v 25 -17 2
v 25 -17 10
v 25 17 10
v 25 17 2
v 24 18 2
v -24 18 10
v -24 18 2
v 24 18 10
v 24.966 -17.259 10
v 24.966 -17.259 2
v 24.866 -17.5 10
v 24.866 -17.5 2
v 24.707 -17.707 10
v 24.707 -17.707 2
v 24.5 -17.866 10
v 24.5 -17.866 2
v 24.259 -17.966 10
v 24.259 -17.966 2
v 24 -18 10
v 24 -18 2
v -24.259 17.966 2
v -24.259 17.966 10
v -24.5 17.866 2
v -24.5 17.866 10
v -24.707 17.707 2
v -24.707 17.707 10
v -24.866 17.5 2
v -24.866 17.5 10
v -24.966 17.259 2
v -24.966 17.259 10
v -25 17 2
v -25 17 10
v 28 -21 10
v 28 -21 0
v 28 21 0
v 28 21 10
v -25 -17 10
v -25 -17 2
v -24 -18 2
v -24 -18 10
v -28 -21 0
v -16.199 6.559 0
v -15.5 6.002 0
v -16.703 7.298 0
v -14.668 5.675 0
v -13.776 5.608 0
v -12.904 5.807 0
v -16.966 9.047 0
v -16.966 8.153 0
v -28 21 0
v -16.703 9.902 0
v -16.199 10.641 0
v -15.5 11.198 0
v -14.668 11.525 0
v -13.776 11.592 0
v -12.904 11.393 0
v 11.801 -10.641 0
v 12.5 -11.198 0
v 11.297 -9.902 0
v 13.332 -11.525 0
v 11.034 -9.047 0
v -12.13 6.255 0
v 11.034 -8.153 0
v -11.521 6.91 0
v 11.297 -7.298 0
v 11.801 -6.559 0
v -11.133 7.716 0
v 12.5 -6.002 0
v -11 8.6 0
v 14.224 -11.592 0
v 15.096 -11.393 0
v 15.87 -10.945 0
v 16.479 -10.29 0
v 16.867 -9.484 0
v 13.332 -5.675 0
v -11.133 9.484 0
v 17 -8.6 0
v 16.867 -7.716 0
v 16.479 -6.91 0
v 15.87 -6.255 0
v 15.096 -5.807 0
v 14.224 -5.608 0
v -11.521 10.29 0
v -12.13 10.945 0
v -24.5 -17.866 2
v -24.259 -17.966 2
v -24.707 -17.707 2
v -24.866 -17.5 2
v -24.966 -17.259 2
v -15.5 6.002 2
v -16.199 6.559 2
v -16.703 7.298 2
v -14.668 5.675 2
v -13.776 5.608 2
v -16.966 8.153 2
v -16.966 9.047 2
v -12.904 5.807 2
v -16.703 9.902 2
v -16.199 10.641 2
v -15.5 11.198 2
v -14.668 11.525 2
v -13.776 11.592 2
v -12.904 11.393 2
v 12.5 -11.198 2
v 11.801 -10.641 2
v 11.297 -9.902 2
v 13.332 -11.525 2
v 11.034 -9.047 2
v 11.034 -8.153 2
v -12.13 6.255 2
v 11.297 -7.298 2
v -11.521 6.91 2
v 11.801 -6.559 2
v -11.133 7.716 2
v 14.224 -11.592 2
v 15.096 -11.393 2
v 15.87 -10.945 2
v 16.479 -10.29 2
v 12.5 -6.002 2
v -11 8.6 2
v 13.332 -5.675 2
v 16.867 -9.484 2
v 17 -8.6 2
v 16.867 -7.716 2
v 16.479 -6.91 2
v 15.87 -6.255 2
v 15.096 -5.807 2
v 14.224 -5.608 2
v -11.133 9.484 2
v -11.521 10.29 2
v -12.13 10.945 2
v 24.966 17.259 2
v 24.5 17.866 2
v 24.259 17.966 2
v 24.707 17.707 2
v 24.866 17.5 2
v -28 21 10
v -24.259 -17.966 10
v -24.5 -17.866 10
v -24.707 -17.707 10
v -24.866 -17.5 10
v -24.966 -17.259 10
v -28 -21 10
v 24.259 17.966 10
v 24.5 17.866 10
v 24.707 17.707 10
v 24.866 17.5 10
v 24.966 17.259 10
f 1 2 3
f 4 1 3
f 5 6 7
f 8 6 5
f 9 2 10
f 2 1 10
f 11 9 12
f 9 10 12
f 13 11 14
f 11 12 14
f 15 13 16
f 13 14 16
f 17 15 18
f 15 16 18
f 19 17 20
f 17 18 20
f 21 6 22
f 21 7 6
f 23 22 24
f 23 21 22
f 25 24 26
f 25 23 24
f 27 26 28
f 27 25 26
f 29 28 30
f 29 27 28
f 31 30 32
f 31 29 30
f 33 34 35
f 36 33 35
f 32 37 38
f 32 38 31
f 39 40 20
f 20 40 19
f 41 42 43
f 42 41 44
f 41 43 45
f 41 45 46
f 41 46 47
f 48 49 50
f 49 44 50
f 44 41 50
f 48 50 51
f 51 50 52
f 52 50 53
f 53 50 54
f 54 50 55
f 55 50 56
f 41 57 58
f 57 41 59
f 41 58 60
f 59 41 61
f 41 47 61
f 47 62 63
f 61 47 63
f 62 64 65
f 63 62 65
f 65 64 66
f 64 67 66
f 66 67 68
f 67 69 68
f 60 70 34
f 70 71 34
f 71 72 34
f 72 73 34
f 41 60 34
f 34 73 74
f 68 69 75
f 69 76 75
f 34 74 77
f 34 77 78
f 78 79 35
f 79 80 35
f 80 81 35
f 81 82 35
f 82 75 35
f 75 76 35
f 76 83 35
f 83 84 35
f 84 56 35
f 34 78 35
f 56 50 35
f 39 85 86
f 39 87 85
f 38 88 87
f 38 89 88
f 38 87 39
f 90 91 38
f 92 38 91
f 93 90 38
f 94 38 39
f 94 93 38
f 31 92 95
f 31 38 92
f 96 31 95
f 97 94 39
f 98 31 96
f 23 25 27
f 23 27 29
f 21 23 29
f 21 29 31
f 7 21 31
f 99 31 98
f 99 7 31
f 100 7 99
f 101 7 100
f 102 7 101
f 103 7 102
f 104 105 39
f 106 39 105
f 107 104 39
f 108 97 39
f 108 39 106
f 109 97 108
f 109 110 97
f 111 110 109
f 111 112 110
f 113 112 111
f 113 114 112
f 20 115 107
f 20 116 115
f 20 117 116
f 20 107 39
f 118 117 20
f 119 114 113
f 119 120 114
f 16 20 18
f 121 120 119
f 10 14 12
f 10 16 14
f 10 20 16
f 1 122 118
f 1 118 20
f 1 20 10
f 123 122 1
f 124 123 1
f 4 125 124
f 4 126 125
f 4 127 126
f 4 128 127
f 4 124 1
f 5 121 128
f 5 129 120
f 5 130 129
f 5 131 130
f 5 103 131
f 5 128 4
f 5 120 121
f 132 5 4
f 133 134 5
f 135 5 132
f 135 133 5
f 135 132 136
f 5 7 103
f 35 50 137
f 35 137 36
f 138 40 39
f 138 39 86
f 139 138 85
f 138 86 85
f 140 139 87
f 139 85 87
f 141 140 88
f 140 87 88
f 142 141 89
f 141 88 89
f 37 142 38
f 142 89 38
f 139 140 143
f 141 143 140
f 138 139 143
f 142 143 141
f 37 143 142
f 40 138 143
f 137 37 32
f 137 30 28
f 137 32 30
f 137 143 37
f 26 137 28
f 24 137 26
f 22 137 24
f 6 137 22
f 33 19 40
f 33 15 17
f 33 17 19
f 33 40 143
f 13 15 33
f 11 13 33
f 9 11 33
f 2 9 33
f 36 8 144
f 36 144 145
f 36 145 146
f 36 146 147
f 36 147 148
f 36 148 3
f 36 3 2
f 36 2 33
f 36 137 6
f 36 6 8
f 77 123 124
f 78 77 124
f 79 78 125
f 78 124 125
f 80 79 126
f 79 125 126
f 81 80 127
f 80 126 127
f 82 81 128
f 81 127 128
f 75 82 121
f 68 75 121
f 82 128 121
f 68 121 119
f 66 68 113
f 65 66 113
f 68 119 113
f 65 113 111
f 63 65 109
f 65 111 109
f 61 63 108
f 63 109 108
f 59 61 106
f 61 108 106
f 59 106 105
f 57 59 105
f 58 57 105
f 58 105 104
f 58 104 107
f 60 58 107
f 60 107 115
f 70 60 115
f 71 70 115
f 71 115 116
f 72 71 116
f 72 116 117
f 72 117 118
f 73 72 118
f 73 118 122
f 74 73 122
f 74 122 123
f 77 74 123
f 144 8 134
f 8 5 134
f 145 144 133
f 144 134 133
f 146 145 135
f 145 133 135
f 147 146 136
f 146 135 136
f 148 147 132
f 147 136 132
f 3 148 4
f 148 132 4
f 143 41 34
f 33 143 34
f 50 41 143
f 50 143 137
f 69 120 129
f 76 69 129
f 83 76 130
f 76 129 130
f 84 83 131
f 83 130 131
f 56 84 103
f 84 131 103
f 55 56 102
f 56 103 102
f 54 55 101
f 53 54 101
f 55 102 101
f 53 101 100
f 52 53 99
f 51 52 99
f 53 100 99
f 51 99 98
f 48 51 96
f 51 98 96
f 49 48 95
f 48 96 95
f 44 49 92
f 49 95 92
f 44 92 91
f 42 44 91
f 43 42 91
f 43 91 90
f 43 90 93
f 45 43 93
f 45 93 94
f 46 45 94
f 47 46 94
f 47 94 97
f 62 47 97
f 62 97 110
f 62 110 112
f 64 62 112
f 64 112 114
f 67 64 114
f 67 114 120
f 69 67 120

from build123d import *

# Parameters (mm, degrees)
SKETCH_W     = 56
SKETCH_H     = 42
PAD_DEPTH    = 10
SKETCH002_W  = 50
SKETCH002_H  = 36
POCKET_DEPTH = 8
FILLET_R     = 1
FILLET001_R  = 1
FILLET002_R  = 1
FILLET003_R  = 1
SKETCH003_R  = 3
HOLE_DEPTH   = 25


with BuildPart() as part:
    # Sketch → Pad (new body)
    with BuildSketch(Plane.XY):
        Rectangle(SKETCH_W, SKETCH_H)
    extrude(amount=PAD_DEPTH)

    # Sketch002 (on Face6 of Pad) → Pocket (cut)
    with BuildSketch(Plane.XY.offset(10)):
        Rectangle(SKETCH002_W, SKETCH002_H)
    extrude(amount=-POCKET_DEPTH, mode=Mode.SUBTRACT)

    # Fillet
    fillet_edges = [part.edges().sort_by_distance(p)[0] for p in [
        (-25, 18, 6),
    ]]
    fillet(fillet_edges, radius=FILLET_R)

    # Fillet001
    fillet001_edges = [part.edges().sort_by_distance(p)[0] for p in [
        (25, 18, 6),
    ]]
    fillet(fillet001_edges, radius=FILLET001_R)

    # Fillet002
    fillet002_edges = [part.edges().sort_by_distance(p)[0] for p in [
        (25, -18, 6),
    ]]
    fillet(fillet002_edges, radius=FILLET002_R)

    # Fillet003
    fillet003_edges = [part.edges().sort_by_distance(p)[0] for p in [
        (-25, -18, 6),
    ]]
    fillet(fillet003_edges, radius=FILLET003_R)

    # Sketch003 (on Face14 of Fillet003) → Hole (cut)
    with BuildSketch(Plane.XY.offset(2)):
        with Locations((-14, 8.6)):
            Circle(SKETCH003_R)
        with Locations((14, -8.6)):
            Circle(SKETCH003_R)
    extrude(amount=-HOLE_DEPTH, mode=Mode.SUBTRACT)


solid = part.part
